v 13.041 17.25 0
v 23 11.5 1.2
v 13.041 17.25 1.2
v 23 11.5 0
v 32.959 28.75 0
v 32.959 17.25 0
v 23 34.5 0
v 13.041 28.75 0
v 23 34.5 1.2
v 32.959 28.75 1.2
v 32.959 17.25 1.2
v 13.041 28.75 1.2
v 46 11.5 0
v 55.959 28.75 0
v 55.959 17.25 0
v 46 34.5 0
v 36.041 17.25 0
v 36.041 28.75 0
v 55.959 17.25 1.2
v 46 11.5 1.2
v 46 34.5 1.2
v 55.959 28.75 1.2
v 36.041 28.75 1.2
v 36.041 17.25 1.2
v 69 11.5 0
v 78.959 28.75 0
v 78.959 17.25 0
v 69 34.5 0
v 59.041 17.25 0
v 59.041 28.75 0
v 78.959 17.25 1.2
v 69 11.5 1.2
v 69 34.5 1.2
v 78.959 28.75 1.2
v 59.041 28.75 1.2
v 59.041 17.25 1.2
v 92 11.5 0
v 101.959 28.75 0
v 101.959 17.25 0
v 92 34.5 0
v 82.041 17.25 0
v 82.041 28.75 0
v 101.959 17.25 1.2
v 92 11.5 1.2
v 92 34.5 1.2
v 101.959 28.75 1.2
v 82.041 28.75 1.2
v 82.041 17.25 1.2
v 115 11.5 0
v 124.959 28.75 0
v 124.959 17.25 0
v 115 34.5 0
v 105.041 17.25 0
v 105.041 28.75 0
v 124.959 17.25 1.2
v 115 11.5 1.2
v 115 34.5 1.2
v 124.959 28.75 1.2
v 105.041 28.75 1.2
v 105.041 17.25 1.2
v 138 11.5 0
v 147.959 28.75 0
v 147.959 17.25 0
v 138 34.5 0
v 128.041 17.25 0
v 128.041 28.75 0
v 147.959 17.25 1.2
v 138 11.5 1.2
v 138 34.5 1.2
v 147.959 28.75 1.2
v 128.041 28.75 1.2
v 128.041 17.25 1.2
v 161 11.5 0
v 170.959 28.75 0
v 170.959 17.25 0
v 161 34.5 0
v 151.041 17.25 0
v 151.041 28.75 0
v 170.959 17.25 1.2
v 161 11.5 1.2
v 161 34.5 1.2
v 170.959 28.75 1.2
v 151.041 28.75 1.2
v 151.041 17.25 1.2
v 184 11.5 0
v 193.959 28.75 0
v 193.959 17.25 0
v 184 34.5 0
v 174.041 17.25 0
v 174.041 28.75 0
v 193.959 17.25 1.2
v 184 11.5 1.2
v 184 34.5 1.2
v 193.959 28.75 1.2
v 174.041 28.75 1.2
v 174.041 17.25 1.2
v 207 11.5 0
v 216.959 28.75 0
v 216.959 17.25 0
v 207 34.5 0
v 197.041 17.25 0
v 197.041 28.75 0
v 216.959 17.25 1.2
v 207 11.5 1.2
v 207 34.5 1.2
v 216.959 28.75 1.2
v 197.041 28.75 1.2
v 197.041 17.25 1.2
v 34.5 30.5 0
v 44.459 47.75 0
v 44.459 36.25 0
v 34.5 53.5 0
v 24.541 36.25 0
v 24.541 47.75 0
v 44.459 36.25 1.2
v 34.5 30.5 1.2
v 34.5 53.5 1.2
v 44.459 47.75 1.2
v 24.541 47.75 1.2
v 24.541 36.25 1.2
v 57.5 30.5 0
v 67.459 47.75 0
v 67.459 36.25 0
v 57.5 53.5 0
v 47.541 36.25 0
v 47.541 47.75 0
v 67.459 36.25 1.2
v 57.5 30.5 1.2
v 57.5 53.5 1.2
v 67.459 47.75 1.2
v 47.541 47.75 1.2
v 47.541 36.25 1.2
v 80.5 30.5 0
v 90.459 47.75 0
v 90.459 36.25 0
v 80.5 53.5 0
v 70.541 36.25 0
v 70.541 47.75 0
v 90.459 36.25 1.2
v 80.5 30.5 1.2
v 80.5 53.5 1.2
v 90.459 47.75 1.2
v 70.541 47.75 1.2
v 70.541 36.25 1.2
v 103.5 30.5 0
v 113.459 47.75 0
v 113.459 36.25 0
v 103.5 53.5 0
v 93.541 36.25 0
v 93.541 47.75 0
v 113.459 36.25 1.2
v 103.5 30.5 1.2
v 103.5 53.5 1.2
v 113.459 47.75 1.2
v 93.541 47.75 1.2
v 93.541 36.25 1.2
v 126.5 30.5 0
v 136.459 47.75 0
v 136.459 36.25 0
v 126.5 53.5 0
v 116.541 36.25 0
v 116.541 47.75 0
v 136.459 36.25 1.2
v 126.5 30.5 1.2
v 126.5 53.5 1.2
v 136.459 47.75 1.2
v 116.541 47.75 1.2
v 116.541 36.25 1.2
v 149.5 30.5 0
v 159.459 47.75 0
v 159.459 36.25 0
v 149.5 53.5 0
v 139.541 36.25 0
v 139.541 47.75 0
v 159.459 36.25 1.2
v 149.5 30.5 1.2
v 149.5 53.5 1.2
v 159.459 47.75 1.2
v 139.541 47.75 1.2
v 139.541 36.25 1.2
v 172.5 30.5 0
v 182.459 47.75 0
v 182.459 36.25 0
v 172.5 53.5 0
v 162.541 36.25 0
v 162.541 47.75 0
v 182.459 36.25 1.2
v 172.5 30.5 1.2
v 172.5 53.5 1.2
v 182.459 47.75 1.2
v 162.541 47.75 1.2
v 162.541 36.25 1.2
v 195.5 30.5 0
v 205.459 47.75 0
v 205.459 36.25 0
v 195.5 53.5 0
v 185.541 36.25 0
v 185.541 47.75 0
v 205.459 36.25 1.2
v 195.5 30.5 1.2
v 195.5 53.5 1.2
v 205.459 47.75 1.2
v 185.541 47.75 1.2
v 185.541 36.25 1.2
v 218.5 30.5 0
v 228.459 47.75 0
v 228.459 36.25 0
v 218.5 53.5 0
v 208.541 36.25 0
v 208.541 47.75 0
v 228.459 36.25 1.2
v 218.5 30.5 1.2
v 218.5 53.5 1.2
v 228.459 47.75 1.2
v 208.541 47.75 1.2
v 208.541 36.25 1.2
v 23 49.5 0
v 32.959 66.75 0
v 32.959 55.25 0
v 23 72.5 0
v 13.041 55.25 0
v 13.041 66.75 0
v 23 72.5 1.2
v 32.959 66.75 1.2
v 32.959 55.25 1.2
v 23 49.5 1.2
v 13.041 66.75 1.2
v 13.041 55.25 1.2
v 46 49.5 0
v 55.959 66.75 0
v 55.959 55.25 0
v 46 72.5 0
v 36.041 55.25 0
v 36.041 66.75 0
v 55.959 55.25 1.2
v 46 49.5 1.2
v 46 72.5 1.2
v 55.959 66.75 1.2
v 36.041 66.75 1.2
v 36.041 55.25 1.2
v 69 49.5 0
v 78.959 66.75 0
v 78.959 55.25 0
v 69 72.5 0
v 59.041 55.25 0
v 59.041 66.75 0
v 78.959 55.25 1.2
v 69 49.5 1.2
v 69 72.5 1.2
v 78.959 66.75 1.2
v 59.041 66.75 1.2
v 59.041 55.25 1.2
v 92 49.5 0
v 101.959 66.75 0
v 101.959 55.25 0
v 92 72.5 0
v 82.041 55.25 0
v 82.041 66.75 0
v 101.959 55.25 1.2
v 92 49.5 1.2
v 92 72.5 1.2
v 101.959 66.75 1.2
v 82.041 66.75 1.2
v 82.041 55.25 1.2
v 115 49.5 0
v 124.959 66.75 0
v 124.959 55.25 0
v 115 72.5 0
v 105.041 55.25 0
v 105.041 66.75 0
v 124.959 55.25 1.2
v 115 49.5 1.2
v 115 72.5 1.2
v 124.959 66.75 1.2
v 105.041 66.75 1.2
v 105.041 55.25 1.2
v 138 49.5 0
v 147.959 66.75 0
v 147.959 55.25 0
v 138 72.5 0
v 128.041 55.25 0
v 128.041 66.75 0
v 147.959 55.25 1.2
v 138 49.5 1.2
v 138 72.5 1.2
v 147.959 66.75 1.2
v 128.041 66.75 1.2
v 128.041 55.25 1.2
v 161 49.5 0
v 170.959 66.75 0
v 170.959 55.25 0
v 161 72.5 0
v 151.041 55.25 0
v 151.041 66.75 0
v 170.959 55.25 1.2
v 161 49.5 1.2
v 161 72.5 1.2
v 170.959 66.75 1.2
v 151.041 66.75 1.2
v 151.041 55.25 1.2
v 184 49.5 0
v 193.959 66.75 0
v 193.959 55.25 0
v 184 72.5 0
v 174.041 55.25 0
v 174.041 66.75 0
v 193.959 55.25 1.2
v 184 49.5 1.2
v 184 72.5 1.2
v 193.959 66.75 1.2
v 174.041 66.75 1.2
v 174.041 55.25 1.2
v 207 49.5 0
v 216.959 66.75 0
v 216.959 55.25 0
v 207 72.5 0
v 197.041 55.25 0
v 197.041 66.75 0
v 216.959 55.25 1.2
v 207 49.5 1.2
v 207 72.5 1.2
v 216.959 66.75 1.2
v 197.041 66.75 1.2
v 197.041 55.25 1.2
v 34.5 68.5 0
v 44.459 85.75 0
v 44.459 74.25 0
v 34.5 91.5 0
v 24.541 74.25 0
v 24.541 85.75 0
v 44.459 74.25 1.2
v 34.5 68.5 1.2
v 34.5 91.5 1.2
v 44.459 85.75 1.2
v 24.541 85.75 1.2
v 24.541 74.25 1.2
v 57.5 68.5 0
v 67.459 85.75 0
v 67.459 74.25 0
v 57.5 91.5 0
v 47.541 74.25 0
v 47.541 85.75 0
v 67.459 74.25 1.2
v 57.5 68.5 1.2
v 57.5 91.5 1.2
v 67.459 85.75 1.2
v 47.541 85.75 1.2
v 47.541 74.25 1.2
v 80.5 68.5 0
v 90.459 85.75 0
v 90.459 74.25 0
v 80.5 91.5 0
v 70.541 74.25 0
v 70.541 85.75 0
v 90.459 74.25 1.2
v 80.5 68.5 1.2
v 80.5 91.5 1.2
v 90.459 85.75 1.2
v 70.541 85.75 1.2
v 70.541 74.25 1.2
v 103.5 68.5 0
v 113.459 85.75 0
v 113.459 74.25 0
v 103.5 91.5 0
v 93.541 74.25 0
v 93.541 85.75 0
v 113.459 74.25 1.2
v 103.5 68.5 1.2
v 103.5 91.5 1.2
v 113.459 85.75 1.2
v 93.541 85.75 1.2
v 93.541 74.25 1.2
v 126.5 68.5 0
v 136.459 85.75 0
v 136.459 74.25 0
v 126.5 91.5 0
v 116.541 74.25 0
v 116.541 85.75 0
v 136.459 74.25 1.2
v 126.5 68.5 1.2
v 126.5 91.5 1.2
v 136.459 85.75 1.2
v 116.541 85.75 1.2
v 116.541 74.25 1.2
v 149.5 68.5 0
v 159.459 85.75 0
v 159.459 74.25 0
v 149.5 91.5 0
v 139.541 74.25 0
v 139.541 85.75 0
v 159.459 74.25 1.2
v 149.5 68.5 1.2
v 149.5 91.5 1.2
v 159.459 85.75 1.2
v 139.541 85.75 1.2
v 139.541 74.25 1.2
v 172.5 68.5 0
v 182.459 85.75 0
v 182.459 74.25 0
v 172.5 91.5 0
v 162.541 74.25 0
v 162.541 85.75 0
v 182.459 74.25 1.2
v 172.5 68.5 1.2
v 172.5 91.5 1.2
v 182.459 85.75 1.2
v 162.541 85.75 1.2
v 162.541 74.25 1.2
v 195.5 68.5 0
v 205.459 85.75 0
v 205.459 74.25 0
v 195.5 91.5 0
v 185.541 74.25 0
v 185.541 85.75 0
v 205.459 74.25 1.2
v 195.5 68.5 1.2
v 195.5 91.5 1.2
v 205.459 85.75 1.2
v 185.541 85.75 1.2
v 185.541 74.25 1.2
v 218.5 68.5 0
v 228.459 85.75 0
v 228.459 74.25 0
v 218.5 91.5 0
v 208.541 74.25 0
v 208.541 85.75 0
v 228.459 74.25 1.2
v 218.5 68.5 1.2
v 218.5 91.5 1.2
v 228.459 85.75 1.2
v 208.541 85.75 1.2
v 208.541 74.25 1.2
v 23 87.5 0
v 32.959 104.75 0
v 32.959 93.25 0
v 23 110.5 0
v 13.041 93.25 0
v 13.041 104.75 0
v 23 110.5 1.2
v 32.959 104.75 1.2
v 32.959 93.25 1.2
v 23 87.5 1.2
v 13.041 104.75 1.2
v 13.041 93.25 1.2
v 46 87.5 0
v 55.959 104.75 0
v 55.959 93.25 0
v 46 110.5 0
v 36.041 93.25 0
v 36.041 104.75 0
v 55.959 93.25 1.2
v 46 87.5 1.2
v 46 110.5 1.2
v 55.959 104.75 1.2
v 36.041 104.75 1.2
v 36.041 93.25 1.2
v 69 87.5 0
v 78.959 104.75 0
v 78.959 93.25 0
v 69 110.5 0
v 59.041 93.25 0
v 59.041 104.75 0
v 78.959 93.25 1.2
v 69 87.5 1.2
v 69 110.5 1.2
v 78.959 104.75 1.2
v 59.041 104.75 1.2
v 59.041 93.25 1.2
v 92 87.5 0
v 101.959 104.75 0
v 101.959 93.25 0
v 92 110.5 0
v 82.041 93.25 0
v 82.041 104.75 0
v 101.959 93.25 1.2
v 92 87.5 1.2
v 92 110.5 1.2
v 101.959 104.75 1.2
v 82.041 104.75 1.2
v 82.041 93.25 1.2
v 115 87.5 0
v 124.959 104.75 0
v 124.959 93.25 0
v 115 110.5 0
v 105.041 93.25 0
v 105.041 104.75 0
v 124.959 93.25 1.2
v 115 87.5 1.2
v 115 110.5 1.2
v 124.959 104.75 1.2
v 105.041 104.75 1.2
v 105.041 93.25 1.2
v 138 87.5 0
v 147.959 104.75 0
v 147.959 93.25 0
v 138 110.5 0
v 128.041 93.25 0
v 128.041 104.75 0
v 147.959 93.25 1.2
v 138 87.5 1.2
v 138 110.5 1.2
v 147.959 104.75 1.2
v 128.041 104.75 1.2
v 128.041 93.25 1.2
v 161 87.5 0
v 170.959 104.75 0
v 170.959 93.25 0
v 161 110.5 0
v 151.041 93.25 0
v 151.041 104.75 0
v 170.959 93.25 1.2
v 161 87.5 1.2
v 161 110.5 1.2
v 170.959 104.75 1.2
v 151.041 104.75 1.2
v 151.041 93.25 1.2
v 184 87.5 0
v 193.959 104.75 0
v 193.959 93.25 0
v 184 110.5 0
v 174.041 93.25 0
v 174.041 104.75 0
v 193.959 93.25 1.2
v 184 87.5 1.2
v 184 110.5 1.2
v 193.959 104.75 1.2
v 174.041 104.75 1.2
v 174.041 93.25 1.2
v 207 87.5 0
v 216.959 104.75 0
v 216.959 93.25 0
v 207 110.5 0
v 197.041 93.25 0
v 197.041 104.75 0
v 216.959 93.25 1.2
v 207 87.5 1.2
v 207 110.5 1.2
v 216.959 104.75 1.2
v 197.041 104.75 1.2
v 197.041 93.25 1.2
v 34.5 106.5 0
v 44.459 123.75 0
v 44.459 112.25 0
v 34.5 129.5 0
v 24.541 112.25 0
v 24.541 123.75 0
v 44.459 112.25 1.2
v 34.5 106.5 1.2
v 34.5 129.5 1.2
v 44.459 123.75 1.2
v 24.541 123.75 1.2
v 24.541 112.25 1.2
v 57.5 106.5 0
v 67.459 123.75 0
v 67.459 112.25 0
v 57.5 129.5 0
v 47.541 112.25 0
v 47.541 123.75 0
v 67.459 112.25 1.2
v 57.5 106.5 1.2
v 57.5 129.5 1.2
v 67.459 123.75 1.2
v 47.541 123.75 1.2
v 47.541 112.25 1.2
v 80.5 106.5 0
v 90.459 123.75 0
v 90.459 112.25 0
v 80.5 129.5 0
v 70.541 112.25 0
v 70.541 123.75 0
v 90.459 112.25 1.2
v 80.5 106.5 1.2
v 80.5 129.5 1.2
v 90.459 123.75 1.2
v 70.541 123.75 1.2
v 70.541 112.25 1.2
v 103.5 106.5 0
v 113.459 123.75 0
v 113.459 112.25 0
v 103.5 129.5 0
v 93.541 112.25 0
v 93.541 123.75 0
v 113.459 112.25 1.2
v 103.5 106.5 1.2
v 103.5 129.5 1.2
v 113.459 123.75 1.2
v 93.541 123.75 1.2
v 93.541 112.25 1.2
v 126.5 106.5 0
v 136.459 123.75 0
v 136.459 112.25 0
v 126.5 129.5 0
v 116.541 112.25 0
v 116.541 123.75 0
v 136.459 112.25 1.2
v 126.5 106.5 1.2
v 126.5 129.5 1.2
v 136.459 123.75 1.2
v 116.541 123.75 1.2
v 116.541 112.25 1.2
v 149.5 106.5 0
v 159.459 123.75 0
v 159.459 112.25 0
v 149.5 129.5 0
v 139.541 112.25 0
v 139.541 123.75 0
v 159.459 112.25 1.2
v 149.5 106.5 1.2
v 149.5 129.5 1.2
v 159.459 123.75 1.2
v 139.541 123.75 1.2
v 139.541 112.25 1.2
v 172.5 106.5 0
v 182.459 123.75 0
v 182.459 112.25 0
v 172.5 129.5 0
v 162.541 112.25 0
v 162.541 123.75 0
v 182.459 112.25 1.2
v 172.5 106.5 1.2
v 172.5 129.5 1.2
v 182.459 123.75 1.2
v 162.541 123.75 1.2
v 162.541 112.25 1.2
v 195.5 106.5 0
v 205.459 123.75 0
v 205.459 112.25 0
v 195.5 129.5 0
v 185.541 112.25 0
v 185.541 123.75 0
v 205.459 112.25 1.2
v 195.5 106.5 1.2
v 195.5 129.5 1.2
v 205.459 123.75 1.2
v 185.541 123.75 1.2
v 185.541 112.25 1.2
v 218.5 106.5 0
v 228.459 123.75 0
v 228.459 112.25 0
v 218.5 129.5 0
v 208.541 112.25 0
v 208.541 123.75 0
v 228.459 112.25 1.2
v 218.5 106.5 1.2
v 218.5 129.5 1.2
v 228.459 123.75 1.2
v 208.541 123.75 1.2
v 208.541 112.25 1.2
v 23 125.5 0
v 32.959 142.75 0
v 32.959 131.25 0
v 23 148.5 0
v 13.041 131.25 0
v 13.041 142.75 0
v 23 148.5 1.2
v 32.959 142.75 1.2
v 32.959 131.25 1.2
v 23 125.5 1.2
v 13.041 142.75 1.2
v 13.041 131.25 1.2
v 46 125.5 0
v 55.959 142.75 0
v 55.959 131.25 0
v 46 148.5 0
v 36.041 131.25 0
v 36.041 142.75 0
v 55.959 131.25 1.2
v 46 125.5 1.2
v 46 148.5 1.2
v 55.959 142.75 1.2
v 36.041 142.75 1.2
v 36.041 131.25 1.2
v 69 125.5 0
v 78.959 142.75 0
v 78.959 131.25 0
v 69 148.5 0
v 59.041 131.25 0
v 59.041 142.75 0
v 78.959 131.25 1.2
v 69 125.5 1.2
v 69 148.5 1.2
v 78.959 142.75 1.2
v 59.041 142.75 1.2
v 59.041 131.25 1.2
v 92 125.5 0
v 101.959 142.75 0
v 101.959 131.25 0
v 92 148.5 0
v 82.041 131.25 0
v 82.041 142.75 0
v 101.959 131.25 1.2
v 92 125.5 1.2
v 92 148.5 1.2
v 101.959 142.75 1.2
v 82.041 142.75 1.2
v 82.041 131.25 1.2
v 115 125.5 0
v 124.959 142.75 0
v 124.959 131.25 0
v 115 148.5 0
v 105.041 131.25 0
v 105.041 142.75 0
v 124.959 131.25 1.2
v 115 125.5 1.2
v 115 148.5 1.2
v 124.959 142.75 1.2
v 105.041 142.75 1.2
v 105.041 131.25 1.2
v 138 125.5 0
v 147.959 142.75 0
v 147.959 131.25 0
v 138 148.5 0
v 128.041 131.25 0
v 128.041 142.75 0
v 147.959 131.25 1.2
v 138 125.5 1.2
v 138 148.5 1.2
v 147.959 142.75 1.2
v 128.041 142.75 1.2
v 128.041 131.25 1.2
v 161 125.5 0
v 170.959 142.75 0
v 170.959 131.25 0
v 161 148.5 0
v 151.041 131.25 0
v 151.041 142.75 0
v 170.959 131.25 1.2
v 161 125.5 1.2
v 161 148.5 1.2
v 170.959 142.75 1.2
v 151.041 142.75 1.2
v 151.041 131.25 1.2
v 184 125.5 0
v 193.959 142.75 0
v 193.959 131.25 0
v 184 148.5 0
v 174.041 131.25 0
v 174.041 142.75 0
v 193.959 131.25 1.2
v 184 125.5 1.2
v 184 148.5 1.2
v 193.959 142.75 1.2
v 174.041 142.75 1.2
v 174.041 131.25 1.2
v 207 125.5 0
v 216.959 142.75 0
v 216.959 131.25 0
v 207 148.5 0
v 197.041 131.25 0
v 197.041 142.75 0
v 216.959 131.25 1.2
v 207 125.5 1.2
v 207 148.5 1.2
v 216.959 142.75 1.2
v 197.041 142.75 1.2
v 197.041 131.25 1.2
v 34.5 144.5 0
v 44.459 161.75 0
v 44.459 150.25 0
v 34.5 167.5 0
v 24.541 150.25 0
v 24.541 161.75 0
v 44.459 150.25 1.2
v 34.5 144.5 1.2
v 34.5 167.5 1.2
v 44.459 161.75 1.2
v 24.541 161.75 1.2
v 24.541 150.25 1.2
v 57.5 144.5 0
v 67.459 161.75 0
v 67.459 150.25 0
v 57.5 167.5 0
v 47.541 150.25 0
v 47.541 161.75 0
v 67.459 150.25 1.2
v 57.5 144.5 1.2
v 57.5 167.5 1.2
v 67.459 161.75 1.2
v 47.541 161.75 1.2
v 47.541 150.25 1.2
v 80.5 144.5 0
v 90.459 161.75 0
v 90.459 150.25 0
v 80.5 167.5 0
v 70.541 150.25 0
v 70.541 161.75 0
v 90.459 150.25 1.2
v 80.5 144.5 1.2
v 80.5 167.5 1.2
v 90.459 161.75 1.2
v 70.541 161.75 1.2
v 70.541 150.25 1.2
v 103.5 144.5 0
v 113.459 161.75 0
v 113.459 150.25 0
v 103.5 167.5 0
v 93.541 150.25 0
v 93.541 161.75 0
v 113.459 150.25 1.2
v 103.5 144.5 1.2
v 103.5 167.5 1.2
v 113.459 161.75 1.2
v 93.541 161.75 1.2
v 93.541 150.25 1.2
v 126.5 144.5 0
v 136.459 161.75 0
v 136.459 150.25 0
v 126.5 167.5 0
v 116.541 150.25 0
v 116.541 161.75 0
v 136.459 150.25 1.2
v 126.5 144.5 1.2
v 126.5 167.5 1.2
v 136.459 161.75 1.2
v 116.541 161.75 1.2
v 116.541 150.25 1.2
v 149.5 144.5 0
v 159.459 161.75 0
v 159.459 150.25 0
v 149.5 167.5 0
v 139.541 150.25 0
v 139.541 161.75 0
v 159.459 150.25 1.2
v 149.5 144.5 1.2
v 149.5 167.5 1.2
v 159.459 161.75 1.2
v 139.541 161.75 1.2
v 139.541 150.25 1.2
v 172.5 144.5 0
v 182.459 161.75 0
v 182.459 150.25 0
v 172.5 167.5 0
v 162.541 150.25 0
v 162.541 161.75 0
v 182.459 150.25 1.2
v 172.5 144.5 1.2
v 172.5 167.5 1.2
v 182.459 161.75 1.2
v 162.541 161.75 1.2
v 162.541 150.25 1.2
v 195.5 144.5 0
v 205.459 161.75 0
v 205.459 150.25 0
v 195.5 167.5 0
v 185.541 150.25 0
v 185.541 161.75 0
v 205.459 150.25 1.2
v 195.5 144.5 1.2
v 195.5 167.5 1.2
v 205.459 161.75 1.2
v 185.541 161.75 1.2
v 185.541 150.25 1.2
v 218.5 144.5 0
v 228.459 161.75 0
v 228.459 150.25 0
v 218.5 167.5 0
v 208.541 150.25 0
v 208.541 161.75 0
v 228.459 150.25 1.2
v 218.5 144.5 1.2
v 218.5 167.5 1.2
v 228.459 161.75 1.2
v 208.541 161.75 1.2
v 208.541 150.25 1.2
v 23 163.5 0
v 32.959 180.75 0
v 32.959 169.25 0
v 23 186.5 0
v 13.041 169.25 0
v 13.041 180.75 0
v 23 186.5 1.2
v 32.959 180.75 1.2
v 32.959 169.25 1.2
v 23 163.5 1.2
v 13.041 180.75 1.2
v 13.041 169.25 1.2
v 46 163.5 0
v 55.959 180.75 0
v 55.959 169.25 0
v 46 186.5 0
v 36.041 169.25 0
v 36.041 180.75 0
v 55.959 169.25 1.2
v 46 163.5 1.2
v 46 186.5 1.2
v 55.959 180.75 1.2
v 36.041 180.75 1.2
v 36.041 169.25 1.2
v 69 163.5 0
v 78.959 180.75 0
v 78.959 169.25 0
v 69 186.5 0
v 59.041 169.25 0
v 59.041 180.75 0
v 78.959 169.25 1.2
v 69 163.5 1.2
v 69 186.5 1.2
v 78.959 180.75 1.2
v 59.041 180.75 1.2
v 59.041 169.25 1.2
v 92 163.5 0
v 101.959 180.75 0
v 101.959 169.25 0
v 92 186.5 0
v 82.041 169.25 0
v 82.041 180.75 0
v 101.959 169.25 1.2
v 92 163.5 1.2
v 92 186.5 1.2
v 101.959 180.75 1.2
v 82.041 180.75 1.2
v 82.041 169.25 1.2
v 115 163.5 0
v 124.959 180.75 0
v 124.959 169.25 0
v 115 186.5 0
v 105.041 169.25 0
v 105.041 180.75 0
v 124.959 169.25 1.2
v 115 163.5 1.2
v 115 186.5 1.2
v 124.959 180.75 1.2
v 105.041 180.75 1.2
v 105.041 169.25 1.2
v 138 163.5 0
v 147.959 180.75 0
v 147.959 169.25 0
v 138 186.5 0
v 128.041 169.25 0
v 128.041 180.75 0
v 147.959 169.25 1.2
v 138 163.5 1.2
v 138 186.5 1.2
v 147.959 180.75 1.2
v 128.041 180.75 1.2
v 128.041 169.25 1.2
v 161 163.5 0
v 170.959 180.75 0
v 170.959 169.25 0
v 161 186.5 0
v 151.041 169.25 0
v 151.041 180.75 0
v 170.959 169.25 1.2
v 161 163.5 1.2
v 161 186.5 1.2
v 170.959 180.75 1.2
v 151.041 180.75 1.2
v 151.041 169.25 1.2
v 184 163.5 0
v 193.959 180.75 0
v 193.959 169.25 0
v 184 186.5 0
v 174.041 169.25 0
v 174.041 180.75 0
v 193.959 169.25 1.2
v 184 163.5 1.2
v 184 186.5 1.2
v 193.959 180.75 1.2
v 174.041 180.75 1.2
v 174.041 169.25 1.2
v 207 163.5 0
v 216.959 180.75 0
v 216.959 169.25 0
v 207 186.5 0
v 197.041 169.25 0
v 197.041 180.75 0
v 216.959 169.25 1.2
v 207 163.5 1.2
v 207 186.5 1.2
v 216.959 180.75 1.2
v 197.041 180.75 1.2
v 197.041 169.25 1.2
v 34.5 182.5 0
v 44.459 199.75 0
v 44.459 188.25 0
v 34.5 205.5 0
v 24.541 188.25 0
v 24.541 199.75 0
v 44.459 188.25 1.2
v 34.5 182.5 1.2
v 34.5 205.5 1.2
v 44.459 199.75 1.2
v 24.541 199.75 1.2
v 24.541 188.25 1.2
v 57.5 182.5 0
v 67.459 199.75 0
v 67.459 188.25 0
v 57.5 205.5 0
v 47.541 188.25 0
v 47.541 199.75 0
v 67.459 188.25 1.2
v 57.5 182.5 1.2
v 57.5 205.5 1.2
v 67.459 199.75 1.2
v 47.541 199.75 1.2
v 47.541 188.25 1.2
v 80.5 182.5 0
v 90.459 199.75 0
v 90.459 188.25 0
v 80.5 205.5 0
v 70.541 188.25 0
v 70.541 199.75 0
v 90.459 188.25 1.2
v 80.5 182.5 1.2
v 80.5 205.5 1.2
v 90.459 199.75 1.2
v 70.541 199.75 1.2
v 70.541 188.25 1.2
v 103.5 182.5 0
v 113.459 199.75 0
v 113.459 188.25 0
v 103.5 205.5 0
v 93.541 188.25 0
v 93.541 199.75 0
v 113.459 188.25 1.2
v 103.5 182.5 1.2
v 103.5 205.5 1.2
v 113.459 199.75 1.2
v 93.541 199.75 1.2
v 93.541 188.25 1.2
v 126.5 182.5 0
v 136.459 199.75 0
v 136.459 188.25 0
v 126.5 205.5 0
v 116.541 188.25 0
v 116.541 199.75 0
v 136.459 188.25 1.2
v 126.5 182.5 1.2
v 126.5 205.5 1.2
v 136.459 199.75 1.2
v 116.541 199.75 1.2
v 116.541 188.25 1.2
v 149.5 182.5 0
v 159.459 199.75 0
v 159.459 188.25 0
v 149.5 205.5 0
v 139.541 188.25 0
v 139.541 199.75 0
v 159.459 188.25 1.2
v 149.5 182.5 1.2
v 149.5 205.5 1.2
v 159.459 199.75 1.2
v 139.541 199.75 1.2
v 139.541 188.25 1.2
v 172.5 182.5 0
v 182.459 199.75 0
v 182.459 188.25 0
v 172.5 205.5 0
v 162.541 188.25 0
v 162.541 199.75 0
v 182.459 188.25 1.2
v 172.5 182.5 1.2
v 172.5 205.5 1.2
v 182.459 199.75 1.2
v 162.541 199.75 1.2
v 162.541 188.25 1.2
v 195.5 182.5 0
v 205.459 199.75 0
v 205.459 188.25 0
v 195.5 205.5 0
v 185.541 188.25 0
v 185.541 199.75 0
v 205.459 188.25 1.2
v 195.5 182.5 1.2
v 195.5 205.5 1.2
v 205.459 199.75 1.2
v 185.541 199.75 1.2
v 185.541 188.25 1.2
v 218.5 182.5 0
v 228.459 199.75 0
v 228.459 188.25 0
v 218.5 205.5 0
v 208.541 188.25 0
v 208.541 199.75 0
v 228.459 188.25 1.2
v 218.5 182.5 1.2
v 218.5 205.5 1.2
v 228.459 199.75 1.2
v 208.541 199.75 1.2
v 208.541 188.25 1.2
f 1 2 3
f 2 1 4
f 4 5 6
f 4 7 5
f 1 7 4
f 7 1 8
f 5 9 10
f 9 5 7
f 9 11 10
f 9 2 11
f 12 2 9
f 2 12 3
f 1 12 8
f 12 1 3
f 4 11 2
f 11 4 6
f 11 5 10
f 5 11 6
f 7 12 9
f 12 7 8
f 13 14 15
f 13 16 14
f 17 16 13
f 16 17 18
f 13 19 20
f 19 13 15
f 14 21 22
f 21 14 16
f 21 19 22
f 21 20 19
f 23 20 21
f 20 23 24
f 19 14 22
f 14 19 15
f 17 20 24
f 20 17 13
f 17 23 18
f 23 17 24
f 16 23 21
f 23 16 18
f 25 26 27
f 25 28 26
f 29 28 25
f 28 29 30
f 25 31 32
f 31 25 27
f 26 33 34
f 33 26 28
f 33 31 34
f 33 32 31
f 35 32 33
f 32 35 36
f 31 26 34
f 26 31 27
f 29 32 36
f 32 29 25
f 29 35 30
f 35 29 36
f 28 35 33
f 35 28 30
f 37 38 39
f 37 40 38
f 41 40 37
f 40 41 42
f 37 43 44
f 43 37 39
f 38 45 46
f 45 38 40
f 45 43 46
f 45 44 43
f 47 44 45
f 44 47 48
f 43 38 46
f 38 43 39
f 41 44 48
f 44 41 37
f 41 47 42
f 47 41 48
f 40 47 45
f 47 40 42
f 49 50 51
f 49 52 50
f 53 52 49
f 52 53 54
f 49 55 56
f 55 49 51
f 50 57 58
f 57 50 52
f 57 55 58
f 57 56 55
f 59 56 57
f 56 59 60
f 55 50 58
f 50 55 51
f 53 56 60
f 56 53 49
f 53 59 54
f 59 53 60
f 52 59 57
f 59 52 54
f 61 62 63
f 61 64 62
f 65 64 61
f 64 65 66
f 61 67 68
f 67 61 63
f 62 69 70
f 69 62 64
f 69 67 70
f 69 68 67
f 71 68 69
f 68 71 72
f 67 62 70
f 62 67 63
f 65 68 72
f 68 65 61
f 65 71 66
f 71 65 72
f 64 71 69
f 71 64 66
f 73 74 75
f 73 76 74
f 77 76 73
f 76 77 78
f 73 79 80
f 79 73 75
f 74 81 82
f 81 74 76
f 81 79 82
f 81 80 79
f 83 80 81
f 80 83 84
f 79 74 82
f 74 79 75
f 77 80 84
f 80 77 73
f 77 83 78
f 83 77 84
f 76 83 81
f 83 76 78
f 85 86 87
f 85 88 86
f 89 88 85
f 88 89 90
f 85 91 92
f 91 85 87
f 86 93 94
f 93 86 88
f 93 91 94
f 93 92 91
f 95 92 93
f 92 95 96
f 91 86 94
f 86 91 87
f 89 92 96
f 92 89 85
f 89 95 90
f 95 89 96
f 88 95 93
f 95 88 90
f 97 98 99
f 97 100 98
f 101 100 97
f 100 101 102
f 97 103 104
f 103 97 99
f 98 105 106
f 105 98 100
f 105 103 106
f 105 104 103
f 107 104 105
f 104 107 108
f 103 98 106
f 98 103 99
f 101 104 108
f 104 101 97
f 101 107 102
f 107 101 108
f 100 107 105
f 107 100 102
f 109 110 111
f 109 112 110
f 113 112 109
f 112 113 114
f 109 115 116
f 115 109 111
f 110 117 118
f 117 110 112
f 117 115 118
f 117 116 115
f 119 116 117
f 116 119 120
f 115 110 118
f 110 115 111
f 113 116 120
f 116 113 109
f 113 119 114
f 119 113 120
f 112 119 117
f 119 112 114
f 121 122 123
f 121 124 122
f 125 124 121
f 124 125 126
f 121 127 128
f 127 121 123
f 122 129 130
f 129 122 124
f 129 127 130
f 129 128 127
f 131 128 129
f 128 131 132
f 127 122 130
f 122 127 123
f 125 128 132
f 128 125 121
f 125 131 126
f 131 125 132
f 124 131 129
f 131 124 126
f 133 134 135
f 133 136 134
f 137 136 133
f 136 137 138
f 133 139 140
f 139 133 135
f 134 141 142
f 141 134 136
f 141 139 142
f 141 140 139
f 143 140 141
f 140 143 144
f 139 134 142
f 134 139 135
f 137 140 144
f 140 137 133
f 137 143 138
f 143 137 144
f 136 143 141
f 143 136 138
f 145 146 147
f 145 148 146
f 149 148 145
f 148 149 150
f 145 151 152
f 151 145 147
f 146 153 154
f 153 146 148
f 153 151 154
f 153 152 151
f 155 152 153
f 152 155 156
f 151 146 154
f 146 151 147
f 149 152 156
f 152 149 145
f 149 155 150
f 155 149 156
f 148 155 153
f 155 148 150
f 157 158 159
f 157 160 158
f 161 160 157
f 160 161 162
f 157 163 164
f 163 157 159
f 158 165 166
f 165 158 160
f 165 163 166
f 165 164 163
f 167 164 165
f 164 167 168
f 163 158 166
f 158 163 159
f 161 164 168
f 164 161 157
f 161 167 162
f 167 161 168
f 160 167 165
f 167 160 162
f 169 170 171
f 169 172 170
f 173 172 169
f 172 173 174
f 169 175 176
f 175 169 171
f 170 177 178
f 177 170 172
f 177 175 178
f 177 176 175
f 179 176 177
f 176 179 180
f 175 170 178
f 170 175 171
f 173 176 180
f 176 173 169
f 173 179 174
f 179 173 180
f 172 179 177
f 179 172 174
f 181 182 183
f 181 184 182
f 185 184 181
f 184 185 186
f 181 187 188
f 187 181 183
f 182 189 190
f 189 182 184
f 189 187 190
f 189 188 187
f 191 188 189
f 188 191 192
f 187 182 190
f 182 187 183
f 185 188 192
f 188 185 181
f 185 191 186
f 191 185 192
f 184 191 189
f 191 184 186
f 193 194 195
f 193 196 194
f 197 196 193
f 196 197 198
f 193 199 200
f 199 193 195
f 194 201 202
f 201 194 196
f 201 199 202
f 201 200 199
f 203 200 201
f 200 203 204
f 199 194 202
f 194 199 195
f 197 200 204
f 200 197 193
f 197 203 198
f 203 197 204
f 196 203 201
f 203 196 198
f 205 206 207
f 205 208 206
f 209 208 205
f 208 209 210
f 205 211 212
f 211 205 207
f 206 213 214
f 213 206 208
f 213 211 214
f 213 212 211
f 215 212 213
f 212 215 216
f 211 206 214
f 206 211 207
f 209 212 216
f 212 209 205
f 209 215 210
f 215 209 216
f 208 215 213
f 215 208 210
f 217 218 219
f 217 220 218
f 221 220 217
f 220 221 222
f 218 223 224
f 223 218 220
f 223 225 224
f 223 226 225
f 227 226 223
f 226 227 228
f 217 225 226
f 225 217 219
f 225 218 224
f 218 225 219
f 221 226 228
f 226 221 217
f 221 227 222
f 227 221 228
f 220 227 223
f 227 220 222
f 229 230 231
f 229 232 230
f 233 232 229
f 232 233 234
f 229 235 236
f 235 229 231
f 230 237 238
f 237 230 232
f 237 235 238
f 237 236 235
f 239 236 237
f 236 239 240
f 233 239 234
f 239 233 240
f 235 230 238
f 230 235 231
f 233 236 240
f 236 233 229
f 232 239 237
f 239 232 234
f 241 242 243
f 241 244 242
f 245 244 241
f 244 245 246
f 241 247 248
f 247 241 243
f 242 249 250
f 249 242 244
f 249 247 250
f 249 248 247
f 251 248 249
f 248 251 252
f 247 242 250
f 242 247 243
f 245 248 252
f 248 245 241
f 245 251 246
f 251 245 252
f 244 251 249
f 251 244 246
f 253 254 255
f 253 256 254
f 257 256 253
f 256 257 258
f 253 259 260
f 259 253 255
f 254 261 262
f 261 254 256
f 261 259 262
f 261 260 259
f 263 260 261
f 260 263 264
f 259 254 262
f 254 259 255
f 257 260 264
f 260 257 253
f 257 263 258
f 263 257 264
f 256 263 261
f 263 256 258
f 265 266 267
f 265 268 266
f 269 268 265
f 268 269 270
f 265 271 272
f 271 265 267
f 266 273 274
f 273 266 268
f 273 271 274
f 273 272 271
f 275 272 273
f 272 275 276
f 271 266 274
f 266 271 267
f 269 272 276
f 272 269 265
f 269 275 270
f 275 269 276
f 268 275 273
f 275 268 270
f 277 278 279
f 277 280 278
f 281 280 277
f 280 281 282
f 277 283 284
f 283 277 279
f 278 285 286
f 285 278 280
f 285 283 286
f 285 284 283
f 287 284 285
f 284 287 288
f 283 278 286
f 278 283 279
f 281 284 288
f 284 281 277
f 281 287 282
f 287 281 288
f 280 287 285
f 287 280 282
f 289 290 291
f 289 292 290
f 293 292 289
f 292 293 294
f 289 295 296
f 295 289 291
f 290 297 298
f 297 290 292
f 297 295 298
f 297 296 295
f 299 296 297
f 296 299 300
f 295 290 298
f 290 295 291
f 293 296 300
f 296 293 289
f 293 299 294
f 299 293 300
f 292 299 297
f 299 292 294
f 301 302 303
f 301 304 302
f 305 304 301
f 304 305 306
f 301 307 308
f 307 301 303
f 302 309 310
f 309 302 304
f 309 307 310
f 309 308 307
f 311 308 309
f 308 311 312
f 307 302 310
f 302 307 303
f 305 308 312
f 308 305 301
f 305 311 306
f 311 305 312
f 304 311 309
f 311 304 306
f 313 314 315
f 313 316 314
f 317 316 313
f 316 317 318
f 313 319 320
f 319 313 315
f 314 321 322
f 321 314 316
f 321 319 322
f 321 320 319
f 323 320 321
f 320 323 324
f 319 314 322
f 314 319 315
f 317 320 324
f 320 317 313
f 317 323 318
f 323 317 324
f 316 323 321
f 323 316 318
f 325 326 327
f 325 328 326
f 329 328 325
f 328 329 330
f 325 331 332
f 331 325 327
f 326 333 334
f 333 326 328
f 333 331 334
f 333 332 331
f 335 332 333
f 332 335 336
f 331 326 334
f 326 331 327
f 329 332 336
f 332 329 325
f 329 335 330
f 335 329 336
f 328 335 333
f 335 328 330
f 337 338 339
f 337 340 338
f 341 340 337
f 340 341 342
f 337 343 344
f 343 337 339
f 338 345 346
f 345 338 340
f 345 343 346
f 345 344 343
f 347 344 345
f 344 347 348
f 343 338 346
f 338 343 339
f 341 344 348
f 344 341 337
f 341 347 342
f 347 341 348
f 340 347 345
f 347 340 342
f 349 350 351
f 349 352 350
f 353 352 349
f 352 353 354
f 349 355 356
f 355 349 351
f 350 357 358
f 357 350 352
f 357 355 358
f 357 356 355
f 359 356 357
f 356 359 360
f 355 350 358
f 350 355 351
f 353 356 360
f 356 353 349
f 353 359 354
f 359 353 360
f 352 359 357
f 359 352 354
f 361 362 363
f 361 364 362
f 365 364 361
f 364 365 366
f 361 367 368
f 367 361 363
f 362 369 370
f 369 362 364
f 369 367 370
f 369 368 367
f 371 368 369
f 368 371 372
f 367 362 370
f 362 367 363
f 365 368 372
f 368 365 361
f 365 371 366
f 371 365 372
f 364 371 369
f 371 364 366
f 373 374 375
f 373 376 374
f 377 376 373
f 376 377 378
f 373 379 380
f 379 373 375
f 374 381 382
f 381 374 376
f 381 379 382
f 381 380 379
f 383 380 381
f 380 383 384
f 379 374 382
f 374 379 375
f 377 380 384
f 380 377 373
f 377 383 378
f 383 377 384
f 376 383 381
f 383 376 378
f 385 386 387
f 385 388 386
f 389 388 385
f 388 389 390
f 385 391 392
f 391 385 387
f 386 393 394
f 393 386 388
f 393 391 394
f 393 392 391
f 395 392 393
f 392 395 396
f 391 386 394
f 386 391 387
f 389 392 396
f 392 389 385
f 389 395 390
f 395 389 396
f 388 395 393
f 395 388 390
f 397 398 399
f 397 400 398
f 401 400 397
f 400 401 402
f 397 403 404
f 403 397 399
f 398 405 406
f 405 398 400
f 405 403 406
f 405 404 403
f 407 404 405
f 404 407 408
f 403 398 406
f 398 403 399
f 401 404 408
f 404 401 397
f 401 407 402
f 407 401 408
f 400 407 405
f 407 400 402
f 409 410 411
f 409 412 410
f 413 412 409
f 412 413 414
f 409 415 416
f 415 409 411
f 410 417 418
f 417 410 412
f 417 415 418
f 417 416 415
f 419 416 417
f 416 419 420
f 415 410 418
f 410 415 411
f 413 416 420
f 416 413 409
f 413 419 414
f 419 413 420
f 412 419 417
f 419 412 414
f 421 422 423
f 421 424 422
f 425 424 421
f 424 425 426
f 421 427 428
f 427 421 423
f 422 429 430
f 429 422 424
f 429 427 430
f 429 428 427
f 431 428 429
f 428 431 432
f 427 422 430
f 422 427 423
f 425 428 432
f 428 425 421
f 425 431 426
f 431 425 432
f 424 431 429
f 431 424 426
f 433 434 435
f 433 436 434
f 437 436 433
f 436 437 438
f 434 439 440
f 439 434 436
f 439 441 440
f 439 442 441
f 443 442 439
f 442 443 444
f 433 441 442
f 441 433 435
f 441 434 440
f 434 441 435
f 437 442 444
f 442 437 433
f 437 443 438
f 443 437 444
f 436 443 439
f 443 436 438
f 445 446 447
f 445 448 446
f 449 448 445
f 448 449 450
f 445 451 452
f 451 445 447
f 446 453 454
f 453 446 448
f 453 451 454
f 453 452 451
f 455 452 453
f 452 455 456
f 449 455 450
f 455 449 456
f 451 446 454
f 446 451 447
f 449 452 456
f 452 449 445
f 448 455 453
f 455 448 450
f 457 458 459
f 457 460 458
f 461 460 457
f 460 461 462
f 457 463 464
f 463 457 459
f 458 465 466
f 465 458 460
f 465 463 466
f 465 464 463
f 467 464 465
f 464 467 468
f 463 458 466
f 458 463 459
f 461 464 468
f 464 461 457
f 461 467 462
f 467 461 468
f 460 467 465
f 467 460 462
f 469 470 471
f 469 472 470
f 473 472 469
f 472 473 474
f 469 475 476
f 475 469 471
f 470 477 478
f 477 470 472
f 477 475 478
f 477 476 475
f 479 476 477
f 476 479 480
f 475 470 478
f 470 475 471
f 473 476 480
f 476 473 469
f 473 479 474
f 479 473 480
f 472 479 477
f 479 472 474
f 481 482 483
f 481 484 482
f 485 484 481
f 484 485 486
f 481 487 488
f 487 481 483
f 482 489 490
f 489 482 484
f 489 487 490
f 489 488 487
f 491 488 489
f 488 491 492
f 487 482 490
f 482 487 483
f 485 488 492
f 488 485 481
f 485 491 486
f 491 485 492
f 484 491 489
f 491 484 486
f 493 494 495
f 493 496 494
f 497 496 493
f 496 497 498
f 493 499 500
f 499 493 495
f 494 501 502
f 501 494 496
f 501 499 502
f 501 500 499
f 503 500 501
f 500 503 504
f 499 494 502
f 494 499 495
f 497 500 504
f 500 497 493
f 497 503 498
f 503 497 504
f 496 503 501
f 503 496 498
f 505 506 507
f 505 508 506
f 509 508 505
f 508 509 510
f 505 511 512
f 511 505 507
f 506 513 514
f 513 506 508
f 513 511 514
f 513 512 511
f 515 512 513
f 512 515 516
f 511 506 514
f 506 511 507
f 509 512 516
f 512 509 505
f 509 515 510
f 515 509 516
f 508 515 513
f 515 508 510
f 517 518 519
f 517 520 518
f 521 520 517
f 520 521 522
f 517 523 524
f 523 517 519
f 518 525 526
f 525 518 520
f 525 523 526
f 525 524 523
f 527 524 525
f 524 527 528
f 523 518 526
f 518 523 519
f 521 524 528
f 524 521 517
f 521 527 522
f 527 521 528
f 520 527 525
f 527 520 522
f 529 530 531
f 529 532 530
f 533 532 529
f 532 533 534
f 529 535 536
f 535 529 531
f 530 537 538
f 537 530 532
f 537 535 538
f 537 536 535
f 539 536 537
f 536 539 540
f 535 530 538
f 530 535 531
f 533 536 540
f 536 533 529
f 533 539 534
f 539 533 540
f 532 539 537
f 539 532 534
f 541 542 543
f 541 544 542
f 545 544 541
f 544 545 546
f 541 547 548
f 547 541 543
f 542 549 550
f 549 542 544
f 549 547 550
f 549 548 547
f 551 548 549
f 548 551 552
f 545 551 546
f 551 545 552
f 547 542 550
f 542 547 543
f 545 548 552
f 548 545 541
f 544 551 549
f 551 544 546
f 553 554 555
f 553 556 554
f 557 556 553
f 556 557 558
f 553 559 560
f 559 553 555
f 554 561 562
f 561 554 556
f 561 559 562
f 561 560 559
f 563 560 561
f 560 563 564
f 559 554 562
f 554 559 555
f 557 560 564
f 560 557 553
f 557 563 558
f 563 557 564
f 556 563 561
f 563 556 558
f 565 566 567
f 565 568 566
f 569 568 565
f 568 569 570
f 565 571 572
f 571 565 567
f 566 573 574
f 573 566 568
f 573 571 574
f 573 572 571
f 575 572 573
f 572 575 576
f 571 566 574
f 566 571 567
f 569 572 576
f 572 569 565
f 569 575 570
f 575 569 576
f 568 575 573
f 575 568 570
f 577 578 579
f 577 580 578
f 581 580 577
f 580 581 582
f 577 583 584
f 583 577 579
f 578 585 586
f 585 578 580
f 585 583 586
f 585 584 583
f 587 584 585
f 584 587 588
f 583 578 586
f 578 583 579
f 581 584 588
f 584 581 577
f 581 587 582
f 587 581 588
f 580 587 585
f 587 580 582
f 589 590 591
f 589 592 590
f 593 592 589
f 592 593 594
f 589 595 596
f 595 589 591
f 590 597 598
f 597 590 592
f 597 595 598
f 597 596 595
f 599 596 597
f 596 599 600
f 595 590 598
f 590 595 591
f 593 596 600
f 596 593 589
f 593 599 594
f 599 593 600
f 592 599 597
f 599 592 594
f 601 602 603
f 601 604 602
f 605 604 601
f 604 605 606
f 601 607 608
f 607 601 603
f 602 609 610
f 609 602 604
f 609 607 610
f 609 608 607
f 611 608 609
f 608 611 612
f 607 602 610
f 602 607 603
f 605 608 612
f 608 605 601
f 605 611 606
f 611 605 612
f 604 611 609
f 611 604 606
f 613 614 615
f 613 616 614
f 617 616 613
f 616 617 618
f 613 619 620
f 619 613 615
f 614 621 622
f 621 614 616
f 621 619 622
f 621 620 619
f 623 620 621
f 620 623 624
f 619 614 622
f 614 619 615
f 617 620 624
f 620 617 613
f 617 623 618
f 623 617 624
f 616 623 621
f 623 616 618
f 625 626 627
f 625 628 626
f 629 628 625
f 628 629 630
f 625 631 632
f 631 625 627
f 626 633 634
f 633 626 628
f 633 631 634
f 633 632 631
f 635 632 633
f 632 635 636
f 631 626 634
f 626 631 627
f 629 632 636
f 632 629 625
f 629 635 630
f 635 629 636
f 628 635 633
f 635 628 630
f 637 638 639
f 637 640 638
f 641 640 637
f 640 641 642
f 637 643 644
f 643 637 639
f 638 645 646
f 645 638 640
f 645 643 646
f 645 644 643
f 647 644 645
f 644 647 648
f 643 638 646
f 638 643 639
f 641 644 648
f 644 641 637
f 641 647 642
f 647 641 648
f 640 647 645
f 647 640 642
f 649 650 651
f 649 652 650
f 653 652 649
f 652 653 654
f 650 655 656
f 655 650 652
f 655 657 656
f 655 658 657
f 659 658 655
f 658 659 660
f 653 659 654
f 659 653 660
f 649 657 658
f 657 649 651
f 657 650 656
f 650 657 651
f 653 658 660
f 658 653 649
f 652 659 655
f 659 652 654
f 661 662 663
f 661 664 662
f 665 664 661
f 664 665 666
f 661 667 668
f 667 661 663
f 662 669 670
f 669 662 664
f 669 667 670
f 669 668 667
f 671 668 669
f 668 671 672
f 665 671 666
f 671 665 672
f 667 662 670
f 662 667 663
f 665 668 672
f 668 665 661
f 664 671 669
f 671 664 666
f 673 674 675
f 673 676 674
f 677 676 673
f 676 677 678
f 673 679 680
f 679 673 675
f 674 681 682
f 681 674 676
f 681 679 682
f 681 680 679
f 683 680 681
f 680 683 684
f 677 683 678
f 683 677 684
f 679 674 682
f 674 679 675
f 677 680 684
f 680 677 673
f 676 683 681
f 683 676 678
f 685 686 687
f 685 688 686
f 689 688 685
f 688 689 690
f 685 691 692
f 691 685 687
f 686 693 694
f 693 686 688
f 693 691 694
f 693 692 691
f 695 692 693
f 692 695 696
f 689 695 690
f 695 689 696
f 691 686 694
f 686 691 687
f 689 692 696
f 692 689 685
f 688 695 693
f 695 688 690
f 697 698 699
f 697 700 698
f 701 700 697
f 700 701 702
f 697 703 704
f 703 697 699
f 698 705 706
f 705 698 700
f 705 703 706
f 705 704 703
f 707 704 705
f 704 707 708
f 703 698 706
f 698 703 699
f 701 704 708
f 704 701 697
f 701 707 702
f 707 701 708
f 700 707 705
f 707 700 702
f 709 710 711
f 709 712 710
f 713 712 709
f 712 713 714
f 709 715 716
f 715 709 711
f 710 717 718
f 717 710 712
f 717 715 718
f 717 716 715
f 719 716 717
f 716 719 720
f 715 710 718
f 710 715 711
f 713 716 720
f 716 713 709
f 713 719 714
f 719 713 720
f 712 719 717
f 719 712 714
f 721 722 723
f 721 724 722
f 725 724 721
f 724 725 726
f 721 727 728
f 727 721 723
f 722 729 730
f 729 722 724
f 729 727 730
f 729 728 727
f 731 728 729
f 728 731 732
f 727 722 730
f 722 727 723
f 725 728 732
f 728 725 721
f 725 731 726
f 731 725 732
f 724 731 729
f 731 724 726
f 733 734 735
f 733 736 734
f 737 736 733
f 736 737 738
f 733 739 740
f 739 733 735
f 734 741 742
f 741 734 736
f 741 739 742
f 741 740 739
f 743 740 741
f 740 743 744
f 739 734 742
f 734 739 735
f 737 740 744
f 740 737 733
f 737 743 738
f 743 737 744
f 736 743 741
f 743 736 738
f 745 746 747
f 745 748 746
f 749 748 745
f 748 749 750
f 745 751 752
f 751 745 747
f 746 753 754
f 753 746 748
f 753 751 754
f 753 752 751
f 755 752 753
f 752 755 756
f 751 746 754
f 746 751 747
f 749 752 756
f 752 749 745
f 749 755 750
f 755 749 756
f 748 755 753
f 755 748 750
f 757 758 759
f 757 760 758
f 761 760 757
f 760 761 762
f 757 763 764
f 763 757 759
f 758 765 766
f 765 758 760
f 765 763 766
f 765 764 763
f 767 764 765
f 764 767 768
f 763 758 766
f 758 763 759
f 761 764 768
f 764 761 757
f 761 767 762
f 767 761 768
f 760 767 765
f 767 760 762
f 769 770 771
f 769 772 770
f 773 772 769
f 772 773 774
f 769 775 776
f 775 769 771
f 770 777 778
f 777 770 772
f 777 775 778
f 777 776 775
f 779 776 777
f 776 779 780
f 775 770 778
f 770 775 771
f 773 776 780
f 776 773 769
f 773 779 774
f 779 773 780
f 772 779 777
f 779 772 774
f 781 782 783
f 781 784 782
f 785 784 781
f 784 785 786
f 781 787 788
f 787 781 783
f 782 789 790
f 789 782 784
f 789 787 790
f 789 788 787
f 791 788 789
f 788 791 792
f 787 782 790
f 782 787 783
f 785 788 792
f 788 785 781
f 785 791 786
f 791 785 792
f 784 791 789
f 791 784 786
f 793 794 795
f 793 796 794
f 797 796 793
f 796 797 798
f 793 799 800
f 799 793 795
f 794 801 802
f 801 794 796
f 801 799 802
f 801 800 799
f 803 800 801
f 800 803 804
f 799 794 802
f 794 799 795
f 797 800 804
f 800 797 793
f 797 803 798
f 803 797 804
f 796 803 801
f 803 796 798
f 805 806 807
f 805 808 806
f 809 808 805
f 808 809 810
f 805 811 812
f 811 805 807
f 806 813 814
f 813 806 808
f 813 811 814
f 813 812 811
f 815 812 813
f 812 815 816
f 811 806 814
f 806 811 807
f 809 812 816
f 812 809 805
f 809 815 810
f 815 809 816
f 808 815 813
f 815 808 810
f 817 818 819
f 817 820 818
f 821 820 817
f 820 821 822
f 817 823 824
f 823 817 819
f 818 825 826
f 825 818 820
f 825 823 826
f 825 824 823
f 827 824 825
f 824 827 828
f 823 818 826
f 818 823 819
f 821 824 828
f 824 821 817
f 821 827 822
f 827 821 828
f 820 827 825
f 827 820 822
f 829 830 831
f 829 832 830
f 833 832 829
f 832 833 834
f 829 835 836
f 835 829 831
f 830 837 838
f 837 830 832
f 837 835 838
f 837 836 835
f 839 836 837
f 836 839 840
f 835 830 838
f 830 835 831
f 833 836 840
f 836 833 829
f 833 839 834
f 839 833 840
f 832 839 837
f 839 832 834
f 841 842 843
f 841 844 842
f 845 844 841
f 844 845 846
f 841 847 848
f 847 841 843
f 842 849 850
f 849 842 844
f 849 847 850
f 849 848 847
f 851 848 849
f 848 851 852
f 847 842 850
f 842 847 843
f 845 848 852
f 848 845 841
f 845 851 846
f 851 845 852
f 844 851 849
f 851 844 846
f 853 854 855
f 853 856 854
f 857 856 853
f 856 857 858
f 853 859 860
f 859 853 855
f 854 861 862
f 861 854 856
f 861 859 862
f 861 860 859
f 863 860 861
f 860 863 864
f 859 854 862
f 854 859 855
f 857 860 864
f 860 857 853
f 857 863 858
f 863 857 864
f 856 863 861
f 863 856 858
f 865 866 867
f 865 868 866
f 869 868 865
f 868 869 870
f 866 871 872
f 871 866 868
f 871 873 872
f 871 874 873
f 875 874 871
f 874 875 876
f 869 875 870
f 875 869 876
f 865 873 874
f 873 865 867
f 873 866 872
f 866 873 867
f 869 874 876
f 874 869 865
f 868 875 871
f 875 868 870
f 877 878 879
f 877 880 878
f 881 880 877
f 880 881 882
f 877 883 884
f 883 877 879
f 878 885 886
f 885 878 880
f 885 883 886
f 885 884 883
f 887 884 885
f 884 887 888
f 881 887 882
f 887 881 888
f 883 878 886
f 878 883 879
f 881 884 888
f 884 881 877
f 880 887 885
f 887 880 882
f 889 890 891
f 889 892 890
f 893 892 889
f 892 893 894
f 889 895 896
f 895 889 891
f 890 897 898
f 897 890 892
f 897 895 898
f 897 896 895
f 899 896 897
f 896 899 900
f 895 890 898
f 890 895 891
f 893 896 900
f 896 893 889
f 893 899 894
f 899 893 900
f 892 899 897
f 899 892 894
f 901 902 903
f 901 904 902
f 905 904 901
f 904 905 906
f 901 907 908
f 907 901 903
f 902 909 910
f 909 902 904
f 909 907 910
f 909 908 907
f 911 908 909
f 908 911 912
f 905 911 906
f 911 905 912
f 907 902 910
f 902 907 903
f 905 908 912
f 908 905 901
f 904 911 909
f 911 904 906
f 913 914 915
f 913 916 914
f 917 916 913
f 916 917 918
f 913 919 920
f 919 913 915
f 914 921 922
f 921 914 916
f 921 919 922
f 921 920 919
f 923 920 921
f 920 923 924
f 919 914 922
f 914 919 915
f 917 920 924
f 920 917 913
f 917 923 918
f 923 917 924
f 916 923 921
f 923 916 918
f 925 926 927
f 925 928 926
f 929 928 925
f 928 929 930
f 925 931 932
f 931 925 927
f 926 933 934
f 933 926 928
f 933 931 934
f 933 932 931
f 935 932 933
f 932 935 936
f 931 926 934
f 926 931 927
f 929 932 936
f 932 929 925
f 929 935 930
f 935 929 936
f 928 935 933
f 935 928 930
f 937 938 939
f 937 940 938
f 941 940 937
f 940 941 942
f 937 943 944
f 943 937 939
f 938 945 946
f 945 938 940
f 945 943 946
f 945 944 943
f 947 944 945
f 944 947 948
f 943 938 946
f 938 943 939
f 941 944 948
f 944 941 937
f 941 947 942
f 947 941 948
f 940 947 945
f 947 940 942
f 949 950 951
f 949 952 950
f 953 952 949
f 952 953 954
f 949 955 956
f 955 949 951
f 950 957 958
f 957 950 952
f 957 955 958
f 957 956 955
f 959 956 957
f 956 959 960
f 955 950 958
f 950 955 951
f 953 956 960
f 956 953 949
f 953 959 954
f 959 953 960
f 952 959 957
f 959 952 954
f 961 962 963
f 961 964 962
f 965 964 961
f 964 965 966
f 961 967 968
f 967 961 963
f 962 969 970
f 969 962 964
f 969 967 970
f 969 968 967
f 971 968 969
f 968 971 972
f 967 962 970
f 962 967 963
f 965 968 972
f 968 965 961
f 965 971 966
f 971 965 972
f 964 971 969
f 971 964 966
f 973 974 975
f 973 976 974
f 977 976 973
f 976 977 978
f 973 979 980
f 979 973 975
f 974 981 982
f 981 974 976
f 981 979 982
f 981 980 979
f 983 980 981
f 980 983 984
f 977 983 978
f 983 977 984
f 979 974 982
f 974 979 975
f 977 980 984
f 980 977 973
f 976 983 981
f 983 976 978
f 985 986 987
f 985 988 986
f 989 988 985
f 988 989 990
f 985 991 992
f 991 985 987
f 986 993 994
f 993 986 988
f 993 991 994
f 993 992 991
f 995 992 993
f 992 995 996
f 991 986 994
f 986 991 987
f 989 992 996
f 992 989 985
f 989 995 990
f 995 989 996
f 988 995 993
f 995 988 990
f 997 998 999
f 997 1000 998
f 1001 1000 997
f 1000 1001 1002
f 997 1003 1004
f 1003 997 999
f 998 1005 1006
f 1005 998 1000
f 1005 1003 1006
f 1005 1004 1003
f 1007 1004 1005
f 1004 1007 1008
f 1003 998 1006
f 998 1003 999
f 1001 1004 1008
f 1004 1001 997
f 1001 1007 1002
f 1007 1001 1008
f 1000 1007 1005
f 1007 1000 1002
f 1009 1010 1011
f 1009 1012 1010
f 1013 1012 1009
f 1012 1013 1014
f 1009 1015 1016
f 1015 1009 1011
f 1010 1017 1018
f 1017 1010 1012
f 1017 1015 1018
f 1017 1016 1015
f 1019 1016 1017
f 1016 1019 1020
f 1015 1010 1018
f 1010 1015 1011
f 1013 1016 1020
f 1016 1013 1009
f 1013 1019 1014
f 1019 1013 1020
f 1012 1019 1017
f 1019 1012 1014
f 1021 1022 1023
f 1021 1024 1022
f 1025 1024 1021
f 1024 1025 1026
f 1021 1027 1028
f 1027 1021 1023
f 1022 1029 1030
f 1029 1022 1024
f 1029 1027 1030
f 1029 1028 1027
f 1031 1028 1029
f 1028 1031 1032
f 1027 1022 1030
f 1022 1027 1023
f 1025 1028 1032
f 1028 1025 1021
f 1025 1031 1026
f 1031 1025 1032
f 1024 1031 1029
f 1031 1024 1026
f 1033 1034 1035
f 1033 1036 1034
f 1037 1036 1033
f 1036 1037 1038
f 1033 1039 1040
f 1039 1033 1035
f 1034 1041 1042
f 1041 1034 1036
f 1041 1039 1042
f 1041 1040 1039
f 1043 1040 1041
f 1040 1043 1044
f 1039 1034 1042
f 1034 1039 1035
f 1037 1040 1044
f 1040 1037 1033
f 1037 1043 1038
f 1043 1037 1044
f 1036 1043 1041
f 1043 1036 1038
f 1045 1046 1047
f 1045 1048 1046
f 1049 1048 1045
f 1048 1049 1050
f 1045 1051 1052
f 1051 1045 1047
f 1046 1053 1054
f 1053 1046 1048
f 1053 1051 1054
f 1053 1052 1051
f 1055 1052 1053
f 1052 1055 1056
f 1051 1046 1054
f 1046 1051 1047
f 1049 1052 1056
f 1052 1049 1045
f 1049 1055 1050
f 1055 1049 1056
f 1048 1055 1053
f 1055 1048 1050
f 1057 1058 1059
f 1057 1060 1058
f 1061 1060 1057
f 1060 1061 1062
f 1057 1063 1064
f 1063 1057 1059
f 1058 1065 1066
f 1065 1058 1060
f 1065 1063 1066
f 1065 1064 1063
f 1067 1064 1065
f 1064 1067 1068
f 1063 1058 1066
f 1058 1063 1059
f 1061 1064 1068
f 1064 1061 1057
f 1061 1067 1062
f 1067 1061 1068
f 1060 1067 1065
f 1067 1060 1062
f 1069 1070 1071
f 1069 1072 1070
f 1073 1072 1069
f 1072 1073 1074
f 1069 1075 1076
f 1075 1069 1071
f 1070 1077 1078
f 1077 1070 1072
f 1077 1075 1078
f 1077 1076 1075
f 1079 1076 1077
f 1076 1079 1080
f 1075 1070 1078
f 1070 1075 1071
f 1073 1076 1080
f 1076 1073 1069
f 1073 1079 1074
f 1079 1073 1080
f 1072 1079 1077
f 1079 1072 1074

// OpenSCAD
/* 
 * Hexagons in an offset grid with a frame.
 *
 * TODO:
 * - Add options to choose extruder (random, cyclic)
 * - Add frame extruder
 * - Add separate height for frame
 * - Compute frame size and position
 * - Add fancy top patterns for hexagons
 */

/* [Hexagons] */

// Hexagon radius
_HexRadius = 11.5; 

// Hexagon height
_HexHeight = 1.2;

/* [Grid] */

// Rows
_RowCount = 16;

// Columns
_ColCount = 18;

// Gap
_Gap = 19;

/* [Frame] */

// Render frame
_Frame = false;

// Frame outer width
_FrameOuterWidth = 250;

// Frame outer depth
_FrameOuterDepth = 150;

// Frame border
_FrameBorder = 7;

/* [Extruders] */

// Extruder mode
//_ExtruderMode = "Random";	// ["Random"]

// first extruder
_FirstExtruder = 1;

// Last extruder
_LastExtruder = 4;

// [Extruder to render]
_WhichExtruder = "All"; // ["All", 1, 2, 3, 4, 5]

// Random seed
_RandomSeed = 1313;

// Map a value of _WhichExtruder to an OpenSCAD color
function ExtruderColor(Extruder) = 
  (Extruder == 1  ) ? "red"    : 
  (Extruder == 2  ) ? "green"  : 
  (Extruder == 3  ) ? "blue"   : 
  (Extruder == 4  ) ? "pink"   :
  (Extruder == 5  ) ? "yellow" :
                      "purple" ;
					  
// If _WhichExtruder is "All" or is not "All" and matches the 
// requested extruder, render the child nodes.

module Extruder(DoExtruder)
{
   color(ExtruderColor(DoExtruder))
   {
     if (_WhichExtruder == "All" || DoExtruder == _WhichExtruder)
     {
       children();
     }
   }
}

module RenderHexagon(Radius, Height, Extruder)
{
	Extruder(Extruder)
	{
		linear_extrude(Height)
		{
			rotate([0, 0, 90])
			{
				circle(Radius, $fn=6);
			}
		}
	}
}

module RenderHexagonGrid(RowCount, ColCount, HexRadius, HexHeight, HexExtruders, Gap, FrameBorder)
{
	translate([FrameBorder + FrameBorder + FrameBorder + 2, FrameBorder + FrameBorder + FrameBorder + 2, 0])
	{
		for (y = [0 : 2 : RowCount / 2])
		{
			/* Even Row */
			for (x = [0 : 2 : ColCount - 1])
			{ 
				Extruder = HexExtruders[x][y];

				translate([x * HexRadius, (y * Gap), 0])
				{
					RenderHexagon(HexRadius, HexHeight, Extruder);
				}
			}
			
			/* Odd Row */
			for (x = [1 : 2 : ColCount - 1])
			{
				Extruder = HexExtruders[x][y];

				translate([x * HexRadius, ((y + 1) * Gap), 0]) 
				{
					RenderHexagon(HexRadius, HexHeight, Extruder);
				}
			}
		}
	}
}

module RenderFrame(FrameOuterWidth, FrameOuterDepth, FrameBorder, HexHeight)
{
	InnerWidth = FrameOuterWidth - (2 * FrameBorder);
	InnerDepth = FrameOuterDepth - (2 * FrameBorder);

	linear_extrude(height=_HexHeight) 
	{
		difference () 
		{
			square([FrameOuterWidth, FrameOuterDepth]);
			translate([FrameBorder, FrameBorder, 0]) 
			{
				square([InnerWidth, InnerDepth]);
			}
		}
	}
}

module main(RowCount, ColCount, HexRadius, HexHeight, Gap, Frame, FrameOuterWidth, FrameOuterDepth, FrameBorder)
{
	HexExtruders = 
	[
		for (r = [1 : RowCount]) 
		[
			for (c = [1 : ColCount])
				round(rands(_FirstExtruder, _LastExtruder, _RandomSeed)[0])
		]
	];
	
	echo(HexExtruders);
	
	RenderHexagonGrid(RowCount, ColCount, HexRadius, HexHeight, HexExtruders, Gap, FrameBorder);
	
	if (_Frame)
	{
		RenderFrame(FrameOuterWidth, FrameOuterDepth, FrameBorder, HexHeight);
	}
}
	
main(_RowCount, _ColCount, _HexRadius, _HexHeight, _Gap, _Frame, _FrameOuterWidth, _FrameOuterDepth, _FrameBorder);
